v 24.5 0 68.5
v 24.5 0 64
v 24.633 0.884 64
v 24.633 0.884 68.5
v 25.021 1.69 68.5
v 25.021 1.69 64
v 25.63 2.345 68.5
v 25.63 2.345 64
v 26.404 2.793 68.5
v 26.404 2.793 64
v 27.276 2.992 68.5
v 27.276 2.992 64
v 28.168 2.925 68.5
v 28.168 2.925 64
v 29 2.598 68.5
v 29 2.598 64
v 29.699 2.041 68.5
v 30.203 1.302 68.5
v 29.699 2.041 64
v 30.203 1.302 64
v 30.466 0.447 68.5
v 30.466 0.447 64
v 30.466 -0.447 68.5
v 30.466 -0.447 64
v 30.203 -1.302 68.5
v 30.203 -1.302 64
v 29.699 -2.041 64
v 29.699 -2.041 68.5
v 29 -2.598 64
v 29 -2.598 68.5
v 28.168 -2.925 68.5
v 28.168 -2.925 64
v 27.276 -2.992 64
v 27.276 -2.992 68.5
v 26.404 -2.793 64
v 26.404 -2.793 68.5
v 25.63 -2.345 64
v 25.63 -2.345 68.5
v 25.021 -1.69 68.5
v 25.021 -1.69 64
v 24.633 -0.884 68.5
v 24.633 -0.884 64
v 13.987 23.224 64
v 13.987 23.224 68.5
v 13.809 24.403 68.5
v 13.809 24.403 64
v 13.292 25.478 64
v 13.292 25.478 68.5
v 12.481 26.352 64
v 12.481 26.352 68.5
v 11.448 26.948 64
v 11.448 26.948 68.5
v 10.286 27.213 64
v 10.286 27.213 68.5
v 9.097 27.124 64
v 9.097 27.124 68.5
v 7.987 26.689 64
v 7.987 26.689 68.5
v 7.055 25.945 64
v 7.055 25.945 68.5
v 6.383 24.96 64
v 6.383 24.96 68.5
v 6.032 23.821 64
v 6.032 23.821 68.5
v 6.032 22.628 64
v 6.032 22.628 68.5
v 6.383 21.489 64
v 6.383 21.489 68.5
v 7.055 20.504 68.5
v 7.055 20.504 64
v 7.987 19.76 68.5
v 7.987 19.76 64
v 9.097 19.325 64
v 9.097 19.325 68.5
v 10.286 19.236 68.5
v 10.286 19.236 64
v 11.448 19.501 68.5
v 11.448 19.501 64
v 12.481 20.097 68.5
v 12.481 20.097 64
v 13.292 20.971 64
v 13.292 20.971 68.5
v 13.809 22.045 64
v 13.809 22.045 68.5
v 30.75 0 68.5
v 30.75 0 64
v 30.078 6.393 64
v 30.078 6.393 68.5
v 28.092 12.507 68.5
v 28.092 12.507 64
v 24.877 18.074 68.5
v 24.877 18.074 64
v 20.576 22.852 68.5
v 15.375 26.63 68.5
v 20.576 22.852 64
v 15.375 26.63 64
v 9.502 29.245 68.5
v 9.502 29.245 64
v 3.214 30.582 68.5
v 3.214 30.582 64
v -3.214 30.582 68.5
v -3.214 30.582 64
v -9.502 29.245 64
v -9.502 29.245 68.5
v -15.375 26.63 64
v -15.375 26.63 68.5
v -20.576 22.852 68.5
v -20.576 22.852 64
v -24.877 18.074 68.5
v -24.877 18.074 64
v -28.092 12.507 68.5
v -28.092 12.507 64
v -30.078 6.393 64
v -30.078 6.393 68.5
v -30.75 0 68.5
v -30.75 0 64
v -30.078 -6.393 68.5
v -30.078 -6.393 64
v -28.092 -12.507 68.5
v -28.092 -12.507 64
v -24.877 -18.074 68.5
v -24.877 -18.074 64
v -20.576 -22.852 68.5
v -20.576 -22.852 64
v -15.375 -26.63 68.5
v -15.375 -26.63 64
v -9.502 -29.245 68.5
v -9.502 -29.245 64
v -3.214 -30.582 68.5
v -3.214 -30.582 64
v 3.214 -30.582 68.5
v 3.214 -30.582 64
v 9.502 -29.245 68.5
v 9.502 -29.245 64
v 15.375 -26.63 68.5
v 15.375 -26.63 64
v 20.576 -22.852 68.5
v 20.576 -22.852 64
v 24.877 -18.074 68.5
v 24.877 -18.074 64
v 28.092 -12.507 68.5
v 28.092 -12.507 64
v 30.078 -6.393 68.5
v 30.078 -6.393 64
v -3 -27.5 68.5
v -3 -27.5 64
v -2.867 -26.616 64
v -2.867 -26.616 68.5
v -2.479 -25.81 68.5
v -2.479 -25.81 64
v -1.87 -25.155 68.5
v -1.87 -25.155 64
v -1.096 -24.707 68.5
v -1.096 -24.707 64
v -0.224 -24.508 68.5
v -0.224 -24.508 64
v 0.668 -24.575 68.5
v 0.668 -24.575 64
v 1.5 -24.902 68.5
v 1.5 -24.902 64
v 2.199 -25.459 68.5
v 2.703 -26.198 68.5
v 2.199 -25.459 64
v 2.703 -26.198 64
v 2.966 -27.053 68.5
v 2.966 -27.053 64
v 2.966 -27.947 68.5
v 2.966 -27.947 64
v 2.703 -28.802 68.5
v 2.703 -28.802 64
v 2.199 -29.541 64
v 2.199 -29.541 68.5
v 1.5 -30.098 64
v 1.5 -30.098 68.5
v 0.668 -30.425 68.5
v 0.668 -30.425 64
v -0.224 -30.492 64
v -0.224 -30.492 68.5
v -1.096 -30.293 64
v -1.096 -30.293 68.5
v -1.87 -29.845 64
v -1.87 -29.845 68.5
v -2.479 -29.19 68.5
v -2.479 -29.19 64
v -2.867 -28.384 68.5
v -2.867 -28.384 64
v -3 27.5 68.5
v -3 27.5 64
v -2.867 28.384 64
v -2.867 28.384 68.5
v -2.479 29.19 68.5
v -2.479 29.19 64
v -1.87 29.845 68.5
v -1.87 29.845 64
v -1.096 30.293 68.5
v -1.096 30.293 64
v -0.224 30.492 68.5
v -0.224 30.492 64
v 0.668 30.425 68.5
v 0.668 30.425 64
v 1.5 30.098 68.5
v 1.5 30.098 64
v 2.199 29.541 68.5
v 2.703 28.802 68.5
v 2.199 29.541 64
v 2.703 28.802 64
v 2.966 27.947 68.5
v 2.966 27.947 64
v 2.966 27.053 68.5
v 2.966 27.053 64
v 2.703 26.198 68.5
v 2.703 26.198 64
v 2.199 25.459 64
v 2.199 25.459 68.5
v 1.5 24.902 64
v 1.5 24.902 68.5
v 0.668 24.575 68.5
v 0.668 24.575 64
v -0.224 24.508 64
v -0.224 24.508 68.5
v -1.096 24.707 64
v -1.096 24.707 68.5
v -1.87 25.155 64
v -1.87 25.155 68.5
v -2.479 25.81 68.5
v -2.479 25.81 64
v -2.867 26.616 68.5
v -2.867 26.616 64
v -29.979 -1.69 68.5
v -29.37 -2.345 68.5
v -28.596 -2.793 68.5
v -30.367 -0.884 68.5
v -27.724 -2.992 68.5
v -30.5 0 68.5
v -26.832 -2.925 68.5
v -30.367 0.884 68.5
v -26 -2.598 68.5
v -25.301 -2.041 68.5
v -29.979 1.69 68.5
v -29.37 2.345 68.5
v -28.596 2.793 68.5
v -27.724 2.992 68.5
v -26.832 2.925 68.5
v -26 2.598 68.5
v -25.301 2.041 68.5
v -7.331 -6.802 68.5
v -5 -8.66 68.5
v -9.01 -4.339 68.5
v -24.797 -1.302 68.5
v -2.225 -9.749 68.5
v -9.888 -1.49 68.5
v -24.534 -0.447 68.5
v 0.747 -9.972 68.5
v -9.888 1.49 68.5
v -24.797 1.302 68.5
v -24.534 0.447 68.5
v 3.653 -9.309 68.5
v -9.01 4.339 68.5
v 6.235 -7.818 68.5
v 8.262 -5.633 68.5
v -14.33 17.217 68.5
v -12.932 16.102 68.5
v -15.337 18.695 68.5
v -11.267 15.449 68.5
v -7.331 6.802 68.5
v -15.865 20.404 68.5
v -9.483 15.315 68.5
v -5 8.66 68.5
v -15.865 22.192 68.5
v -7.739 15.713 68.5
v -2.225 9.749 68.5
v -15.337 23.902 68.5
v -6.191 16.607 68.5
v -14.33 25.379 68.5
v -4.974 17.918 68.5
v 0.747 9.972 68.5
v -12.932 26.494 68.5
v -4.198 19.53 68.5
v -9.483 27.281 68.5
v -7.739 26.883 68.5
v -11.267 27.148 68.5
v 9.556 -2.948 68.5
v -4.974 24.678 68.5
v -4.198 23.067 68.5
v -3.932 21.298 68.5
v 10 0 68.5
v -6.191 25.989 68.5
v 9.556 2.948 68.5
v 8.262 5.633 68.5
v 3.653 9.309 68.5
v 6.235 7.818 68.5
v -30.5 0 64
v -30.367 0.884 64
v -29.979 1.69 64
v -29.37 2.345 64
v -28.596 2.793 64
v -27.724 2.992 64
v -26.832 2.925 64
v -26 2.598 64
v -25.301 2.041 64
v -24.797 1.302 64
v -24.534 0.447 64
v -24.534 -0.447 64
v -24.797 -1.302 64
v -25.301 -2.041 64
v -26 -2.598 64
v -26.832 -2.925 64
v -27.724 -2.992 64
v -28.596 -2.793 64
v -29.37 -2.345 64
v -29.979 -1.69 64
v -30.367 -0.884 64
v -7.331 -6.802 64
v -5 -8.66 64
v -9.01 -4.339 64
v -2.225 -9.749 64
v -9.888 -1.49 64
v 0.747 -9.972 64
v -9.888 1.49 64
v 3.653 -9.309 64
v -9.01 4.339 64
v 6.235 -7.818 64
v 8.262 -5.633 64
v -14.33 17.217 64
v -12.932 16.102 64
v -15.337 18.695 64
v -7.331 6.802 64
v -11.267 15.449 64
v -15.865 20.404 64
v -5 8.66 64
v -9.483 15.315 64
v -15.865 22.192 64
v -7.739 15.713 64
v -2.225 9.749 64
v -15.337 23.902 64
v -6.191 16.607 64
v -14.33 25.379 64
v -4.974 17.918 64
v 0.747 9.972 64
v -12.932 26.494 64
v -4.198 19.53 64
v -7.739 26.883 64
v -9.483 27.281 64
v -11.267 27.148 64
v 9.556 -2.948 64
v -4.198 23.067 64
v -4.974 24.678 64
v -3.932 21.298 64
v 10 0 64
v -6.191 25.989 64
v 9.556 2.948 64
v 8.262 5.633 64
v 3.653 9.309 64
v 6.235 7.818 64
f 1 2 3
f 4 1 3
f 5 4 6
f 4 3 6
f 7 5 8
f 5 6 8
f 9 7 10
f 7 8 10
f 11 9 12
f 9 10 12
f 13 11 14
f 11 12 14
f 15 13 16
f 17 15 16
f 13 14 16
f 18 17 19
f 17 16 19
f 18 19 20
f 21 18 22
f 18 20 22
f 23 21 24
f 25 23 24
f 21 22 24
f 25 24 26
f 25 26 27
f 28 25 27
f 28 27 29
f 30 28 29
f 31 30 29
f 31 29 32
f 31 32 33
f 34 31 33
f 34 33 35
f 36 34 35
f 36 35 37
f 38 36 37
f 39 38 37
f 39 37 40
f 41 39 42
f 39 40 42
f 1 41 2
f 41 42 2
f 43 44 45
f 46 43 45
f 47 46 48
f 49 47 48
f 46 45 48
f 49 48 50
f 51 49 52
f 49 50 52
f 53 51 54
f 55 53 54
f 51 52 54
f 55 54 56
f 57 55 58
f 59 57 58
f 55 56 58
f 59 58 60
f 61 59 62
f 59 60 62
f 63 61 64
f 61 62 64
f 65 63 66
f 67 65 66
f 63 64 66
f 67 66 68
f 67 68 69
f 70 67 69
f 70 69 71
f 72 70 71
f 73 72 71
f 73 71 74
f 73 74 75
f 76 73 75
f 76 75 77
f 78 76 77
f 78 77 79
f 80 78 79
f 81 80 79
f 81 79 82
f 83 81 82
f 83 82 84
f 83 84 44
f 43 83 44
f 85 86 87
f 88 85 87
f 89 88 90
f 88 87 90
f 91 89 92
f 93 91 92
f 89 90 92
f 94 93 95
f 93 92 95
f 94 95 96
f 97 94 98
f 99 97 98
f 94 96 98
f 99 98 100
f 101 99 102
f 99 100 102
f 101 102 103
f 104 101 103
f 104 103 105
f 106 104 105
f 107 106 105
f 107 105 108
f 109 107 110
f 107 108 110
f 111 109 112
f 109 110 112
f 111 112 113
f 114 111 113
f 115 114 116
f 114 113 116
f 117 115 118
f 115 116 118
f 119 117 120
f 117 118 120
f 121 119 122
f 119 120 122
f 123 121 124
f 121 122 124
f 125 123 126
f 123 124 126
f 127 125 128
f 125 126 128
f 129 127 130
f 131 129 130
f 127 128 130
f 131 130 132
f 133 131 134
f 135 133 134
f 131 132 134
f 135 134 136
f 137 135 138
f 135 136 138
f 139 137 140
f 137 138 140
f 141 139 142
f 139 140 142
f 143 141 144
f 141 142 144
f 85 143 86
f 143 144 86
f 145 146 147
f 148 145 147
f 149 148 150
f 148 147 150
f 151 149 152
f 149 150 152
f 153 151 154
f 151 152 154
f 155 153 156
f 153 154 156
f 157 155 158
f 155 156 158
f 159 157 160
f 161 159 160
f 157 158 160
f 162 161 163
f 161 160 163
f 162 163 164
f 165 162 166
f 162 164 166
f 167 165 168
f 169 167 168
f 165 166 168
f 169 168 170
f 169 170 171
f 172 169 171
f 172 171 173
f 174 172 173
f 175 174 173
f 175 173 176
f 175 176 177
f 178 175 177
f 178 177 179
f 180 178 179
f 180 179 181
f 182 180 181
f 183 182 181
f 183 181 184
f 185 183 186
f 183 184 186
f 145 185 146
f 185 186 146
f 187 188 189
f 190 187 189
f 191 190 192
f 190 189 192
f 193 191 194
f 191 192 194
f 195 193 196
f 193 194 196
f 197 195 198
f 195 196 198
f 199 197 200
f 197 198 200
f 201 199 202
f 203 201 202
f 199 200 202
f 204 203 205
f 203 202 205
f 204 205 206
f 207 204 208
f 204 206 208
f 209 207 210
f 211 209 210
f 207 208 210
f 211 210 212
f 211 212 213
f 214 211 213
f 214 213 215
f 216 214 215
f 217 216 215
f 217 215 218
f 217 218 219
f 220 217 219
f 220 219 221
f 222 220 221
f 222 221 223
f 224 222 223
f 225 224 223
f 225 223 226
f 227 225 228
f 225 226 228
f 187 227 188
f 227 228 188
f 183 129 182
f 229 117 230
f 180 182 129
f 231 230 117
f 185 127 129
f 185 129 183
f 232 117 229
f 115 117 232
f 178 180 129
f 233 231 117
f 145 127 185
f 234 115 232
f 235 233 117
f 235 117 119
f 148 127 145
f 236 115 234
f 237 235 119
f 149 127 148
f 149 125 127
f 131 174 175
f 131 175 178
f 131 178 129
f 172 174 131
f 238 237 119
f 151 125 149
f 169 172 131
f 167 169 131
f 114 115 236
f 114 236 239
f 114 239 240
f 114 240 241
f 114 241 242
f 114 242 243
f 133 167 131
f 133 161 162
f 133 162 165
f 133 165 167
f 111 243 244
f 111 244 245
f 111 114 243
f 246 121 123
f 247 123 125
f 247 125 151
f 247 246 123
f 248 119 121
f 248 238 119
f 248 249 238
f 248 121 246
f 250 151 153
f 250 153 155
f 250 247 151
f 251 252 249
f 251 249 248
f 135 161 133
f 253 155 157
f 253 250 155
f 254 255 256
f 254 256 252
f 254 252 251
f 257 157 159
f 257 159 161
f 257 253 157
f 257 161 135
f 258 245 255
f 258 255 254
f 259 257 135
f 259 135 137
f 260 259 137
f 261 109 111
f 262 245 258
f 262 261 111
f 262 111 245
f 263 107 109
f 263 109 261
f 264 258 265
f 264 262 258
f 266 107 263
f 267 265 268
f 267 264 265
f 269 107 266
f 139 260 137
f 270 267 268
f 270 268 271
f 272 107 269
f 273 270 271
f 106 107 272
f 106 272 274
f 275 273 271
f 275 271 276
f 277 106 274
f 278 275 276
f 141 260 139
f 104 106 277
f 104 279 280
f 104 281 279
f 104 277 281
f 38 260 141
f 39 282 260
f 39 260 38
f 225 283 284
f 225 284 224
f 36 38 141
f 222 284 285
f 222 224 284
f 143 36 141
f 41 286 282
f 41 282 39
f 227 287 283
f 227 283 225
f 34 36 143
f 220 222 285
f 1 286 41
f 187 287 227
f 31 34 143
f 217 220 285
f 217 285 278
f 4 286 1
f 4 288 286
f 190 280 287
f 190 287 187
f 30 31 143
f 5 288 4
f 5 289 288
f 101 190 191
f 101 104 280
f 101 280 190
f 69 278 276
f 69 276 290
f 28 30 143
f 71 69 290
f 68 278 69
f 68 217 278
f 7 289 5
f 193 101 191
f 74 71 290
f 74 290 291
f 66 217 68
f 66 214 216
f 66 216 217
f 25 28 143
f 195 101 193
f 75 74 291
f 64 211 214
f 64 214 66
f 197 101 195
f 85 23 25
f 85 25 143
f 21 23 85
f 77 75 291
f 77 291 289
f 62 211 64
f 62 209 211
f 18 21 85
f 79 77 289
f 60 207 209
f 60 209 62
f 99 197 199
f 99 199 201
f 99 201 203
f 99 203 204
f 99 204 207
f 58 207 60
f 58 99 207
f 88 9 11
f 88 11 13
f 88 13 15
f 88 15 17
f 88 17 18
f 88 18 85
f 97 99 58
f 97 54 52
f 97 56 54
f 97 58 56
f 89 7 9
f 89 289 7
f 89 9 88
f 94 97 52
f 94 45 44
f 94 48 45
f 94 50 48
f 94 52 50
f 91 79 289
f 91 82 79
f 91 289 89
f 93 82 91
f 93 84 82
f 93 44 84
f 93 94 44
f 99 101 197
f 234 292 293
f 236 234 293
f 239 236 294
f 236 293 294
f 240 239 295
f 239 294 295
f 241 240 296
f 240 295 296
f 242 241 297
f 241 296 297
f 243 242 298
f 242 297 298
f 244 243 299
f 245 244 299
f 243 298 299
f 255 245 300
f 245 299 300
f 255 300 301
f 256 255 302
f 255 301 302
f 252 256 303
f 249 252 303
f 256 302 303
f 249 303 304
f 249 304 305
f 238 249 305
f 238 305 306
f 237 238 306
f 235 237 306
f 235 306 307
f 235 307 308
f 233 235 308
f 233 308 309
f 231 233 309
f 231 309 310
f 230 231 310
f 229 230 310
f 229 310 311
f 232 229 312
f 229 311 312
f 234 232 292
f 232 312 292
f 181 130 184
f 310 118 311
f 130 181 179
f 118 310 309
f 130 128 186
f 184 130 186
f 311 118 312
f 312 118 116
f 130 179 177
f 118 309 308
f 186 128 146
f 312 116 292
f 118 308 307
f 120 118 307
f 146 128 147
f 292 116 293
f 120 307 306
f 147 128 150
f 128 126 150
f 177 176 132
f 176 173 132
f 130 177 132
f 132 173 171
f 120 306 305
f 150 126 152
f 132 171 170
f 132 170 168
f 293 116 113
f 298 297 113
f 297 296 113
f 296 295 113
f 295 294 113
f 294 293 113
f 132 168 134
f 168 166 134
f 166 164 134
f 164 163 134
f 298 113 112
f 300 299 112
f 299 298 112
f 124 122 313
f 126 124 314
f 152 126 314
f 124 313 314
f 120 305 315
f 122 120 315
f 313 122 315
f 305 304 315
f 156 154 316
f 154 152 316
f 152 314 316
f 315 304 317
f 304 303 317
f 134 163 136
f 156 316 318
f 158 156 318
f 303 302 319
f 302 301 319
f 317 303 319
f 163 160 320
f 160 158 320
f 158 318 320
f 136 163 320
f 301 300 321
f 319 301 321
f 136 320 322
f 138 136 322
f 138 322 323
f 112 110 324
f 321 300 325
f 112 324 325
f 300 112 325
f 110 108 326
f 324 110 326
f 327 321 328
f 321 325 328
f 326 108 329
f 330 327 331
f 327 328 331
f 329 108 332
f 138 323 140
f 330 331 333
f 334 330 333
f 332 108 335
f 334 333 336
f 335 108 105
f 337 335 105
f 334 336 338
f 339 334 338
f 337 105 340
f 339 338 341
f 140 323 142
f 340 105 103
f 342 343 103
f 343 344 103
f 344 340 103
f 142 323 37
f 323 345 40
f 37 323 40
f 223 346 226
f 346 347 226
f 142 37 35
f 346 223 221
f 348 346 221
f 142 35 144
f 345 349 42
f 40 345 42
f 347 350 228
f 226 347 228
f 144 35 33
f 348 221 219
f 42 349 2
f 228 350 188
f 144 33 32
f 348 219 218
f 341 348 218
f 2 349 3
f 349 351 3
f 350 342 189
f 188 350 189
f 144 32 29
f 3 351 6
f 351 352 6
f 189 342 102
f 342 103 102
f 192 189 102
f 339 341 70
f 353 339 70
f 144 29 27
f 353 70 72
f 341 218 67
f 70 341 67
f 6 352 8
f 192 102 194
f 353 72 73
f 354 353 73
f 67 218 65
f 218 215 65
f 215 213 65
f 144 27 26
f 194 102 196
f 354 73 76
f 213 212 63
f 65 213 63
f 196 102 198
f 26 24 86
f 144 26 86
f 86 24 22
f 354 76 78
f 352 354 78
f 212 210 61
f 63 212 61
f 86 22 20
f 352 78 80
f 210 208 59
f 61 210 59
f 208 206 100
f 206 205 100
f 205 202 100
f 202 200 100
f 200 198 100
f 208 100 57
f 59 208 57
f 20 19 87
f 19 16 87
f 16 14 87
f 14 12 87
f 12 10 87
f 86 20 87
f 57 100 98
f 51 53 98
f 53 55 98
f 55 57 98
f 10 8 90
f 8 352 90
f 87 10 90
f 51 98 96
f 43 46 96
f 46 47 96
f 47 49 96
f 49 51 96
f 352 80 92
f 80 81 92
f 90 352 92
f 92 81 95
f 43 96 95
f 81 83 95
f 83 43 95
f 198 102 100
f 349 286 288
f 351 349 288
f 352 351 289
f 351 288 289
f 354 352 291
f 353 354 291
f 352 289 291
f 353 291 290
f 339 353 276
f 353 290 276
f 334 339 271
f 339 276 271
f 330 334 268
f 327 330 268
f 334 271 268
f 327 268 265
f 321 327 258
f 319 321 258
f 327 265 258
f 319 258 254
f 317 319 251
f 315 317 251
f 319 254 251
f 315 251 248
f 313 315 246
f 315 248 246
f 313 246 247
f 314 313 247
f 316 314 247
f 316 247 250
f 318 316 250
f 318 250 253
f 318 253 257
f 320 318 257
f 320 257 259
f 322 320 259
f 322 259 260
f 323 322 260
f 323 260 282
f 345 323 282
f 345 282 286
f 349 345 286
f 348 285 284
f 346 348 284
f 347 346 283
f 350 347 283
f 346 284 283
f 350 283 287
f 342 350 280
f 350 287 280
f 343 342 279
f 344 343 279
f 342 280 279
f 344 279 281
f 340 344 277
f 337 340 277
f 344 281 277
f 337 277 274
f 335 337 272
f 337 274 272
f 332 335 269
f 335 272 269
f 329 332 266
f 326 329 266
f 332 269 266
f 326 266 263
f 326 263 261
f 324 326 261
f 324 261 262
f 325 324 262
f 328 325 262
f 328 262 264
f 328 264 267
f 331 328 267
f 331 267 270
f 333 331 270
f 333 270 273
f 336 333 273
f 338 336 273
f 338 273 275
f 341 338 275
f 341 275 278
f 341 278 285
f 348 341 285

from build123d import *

# Parameters (mm, degrees)
ESQUISSE1_R                  = 30.75
BOSS_EXTRU_1_DEPTH           = 8
ESQUISSE2_R                  = 3
BOSS_EXTRU_2_DEPTH           = 56
ESQUISSE4_R                  = 30.75
BOSS_EXTRU_4_DEPTH           = 4.5
ESQUISSE6_R                  = 3
BOSS_EXTRU_5_DEPTH           = 40
ESQUISSE12_R                 = 4
ENL_V_MAT_EXTRU_1_DEPTH      = 6
ESQUISSE13_R                 = 6
ENL_V_MAT_EXTRU_2_DEPTH      = 10
ESQUISSE15_R                 = 10
ENL_V_MAT_EXTRU_3_DEPTH      = 10
ESQUISSE18_R                 = 30.75
BOSS_EXTRU_10_DEPTH          = 4.5
ESQUISSE19_R                 = 2.05
ENL_V_MAT_EXTRU_4_DEPTH      = 62
ESQUISSE20_R                 = 3.5
ENL_V_MAT_EXTRU_5_DEPTH      = 10
ESQUISSE21_R                 = 3
ENL_V_MAT_EXTRU_6_DEPTH      = 78.376514687
ENL_V_MAT_EXTRU_7_DEPTH      = 122.079003185
ENL_V_MAT_EXTRU_7_DEPTH_BACK = 122.079003185
ESQUISSE22_W                 = 61.5
ESQUISSE22_H                 = 64
ESQUISSE22_H_2               = 4.5


with BuildPart() as part:
    # Esquisse1 → Boss.-Extru.1 (new body)
    with BuildSketch(Plane.XY):
        Circle(ESQUISSE1_R)
    extrude(amount=BOSS_EXTRU_1_DEPTH)

    # Esquisse2 → Boss.-Extru.2 (add)
    with BuildSketch(Plane.XY.offset(8)):
        with Locations((0, 27.5)):
            Circle(ESQUISSE2_R)
        with Locations((27.5, 0)):
            Circle(ESQUISSE2_R)
        with Locations((-27.5, 0)):
            Circle(ESQUISSE2_R)
        with Locations((0, -27.5)):
            Circle(ESQUISSE2_R)
    extrude(amount=BOSS_EXTRU_2_DEPTH)

    # Esquisse4 → Boss.-Extru.4 (add)
    with BuildSketch(Plane.XY.offset(64)):
        Circle(ESQUISSE4_R)
    extrude(amount=BOSS_EXTRU_4_DEPTH)

    # Esquisse6 → Boss.-Extru.5 (add)
    with BuildSketch(Plane.XY.offset(68.5)):
        with Locations((0, -27.5)):
            Circle(ESQUISSE6_R)
        with Locations((-27.5, 0)):
            Circle(ESQUISSE6_R)
        with Locations((0, 27.5)):
            Circle(ESQUISSE6_R)
        with Locations((27.5, 0)):
            Circle(ESQUISSE6_R)
    extrude(amount=BOSS_EXTRU_5_DEPTH)

    # Esquisse12 → Enlèv. mat.-Extru.1 (cut)
    with BuildSketch(Plane.XY.offset(68.5)):
        with Locations((9.98690327, 23.224420757)):
            Circle(ESQUISSE12_R)
    extrude(amount=-ENL_V_MAT_EXTRU_1_DEPTH, mode=Mode.SUBTRACT)

    # Esquisse13 → Enlèv. mat.-Extru.2 (cut)
    with BuildSketch(Plane.XY.offset(68.5)):
        with Locations((-9.931529151, 21.298232995)):
            Circle(ESQUISSE13_R)
    extrude(amount=-ENL_V_MAT_EXTRU_2_DEPTH, mode=Mode.SUBTRACT)

    # Esquisse15 → Enlèv. mat.-Extru.3 (cut)
    with BuildSketch(Plane.XY.offset(68.5)):
        Circle(ESQUISSE15_R)
    extrude(amount=-ENL_V_MAT_EXTRU_3_DEPTH, mode=Mode.SUBTRACT)

    # Esquisse18 → Boss.-Extru.10 (add)
    with BuildSketch(Plane.XY.offset(108.5)):
        Circle(ESQUISSE18_R)
    extrude(amount=BOSS_EXTRU_10_DEPTH)

    # Esquisse19 → Enlèv. mat.-Extru.4 (cut)
    with BuildSketch(Plane.ZY.offset(30.75)):
        with Locations((4, 0.25)):
            Circle(ESQUISSE19_R)
    extrude(amount=-ENL_V_MAT_EXTRU_4_DEPTH, mode=Mode.SUBTRACT)

    # Esquisse20 → Enlèv. mat.-Extru.5 (cut)
    with BuildSketch(Plane.XY.offset(113)):
        with Locations((21.297953152, 14.912987345)):
            Circle(ESQUISSE20_R)
        with Locations((-14.912987345, 21.297953152)):
            Circle(ESQUISSE20_R)
        with Locations((-21.297953152, -14.912987345)):
            Circle(ESQUISSE20_R)
        with Locations((14.912987345, -21.297953152)):
            Circle(ESQUISSE20_R)
    extrude(amount=-ENL_V_MAT_EXTRU_5_DEPTH, mode=Mode.SUBTRACT)

    # Esquisse21 → Enlèv. mat.-Extru.6 (cut, through all)
    with BuildSketch(Plane(origin=(0, 0, 64), x_dir=(-1, 0, 0), z_dir=(0, 0, -1))):
        with Locations((0, 27.5)):
            Circle(ESQUISSE21_R)
        with Locations((-27.5, 0)):
            Circle(ESQUISSE21_R)
        with Locations((0, -27.5)):
            Circle(ESQUISSE21_R)
        with Locations((27.5, 0)):
            Circle(ESQUISSE21_R)
    extrude(amount=-ENL_V_MAT_EXTRU_6_DEPTH, mode=Mode.SUBTRACT)


with BuildPart() as enl_v_mat_extru_6_piece_1:
    # of the separate pieces the step leaves, piece 1, a body of its own (enl_v_mat_extru_6_pieces)
    add(part.part.solids().sort_by_distance((3, -27.5, 8))[0])


with BuildPart() as enl_v_mat_extru_6_piece_2:
    # of the separate pieces the step leaves, piece 2, a body of its own (enl_v_mat_extru_6_pieces)
    add(part.part.solids().sort_by_distance((30.75, 0, 108.5))[0])


with BuildPart() as enl_v_mat_extru_6_piece_3:
    # of the separate pieces the step leaves, piece 3, a body of its own (enl_v_mat_extru_6_pieces)
    add(part.part.solids().sort_by_distance((30.75, 0, 68.5))[0])


with BuildPart() as enl_v_mat_extru_7_tool:
    # Esquisse22 → Enlèv. mat.-Extru.7 (new, two sides: drawn at the far end of the back side and taken through both)
    with BuildSketch(Plane(origin=(0, 0, 0), x_dir=(1, 0, 0), z_dir=(0, 1, 0)).offset(-ENL_V_MAT_EXTRU_7_DEPTH_BACK)):
        with Locations((0, -32)):
            Rectangle(ESQUISSE22_W, ESQUISSE22_H)
        with Locations((0, -110.75)):
            Rectangle(ESQUISSE22_W, ESQUISSE22_H_2)
    extrude(amount=ENL_V_MAT_EXTRU_7_DEPTH + ENL_V_MAT_EXTRU_7_DEPTH_BACK)


with BuildPart() as enl_v_mat_extru_6_piece_1_1:
    add(enl_v_mat_extru_6_piece_1.part)

    # Enlèv. mat.-Extru.7: cut by enl_v_mat_extru_7_tool
    add(enl_v_mat_extru_7_tool.part, mode=Mode.SUBTRACT)


with BuildPart() as enl_v_mat_extru_6_piece_2_1:
    add(enl_v_mat_extru_6_piece_2.part)

    # Enlèv. mat.-Extru.7: cut by enl_v_mat_extru_7_tool
    add(enl_v_mat_extru_7_tool.part, mode=Mode.SUBTRACT)


solid = enl_v_mat_extru_6_piece_3.part
